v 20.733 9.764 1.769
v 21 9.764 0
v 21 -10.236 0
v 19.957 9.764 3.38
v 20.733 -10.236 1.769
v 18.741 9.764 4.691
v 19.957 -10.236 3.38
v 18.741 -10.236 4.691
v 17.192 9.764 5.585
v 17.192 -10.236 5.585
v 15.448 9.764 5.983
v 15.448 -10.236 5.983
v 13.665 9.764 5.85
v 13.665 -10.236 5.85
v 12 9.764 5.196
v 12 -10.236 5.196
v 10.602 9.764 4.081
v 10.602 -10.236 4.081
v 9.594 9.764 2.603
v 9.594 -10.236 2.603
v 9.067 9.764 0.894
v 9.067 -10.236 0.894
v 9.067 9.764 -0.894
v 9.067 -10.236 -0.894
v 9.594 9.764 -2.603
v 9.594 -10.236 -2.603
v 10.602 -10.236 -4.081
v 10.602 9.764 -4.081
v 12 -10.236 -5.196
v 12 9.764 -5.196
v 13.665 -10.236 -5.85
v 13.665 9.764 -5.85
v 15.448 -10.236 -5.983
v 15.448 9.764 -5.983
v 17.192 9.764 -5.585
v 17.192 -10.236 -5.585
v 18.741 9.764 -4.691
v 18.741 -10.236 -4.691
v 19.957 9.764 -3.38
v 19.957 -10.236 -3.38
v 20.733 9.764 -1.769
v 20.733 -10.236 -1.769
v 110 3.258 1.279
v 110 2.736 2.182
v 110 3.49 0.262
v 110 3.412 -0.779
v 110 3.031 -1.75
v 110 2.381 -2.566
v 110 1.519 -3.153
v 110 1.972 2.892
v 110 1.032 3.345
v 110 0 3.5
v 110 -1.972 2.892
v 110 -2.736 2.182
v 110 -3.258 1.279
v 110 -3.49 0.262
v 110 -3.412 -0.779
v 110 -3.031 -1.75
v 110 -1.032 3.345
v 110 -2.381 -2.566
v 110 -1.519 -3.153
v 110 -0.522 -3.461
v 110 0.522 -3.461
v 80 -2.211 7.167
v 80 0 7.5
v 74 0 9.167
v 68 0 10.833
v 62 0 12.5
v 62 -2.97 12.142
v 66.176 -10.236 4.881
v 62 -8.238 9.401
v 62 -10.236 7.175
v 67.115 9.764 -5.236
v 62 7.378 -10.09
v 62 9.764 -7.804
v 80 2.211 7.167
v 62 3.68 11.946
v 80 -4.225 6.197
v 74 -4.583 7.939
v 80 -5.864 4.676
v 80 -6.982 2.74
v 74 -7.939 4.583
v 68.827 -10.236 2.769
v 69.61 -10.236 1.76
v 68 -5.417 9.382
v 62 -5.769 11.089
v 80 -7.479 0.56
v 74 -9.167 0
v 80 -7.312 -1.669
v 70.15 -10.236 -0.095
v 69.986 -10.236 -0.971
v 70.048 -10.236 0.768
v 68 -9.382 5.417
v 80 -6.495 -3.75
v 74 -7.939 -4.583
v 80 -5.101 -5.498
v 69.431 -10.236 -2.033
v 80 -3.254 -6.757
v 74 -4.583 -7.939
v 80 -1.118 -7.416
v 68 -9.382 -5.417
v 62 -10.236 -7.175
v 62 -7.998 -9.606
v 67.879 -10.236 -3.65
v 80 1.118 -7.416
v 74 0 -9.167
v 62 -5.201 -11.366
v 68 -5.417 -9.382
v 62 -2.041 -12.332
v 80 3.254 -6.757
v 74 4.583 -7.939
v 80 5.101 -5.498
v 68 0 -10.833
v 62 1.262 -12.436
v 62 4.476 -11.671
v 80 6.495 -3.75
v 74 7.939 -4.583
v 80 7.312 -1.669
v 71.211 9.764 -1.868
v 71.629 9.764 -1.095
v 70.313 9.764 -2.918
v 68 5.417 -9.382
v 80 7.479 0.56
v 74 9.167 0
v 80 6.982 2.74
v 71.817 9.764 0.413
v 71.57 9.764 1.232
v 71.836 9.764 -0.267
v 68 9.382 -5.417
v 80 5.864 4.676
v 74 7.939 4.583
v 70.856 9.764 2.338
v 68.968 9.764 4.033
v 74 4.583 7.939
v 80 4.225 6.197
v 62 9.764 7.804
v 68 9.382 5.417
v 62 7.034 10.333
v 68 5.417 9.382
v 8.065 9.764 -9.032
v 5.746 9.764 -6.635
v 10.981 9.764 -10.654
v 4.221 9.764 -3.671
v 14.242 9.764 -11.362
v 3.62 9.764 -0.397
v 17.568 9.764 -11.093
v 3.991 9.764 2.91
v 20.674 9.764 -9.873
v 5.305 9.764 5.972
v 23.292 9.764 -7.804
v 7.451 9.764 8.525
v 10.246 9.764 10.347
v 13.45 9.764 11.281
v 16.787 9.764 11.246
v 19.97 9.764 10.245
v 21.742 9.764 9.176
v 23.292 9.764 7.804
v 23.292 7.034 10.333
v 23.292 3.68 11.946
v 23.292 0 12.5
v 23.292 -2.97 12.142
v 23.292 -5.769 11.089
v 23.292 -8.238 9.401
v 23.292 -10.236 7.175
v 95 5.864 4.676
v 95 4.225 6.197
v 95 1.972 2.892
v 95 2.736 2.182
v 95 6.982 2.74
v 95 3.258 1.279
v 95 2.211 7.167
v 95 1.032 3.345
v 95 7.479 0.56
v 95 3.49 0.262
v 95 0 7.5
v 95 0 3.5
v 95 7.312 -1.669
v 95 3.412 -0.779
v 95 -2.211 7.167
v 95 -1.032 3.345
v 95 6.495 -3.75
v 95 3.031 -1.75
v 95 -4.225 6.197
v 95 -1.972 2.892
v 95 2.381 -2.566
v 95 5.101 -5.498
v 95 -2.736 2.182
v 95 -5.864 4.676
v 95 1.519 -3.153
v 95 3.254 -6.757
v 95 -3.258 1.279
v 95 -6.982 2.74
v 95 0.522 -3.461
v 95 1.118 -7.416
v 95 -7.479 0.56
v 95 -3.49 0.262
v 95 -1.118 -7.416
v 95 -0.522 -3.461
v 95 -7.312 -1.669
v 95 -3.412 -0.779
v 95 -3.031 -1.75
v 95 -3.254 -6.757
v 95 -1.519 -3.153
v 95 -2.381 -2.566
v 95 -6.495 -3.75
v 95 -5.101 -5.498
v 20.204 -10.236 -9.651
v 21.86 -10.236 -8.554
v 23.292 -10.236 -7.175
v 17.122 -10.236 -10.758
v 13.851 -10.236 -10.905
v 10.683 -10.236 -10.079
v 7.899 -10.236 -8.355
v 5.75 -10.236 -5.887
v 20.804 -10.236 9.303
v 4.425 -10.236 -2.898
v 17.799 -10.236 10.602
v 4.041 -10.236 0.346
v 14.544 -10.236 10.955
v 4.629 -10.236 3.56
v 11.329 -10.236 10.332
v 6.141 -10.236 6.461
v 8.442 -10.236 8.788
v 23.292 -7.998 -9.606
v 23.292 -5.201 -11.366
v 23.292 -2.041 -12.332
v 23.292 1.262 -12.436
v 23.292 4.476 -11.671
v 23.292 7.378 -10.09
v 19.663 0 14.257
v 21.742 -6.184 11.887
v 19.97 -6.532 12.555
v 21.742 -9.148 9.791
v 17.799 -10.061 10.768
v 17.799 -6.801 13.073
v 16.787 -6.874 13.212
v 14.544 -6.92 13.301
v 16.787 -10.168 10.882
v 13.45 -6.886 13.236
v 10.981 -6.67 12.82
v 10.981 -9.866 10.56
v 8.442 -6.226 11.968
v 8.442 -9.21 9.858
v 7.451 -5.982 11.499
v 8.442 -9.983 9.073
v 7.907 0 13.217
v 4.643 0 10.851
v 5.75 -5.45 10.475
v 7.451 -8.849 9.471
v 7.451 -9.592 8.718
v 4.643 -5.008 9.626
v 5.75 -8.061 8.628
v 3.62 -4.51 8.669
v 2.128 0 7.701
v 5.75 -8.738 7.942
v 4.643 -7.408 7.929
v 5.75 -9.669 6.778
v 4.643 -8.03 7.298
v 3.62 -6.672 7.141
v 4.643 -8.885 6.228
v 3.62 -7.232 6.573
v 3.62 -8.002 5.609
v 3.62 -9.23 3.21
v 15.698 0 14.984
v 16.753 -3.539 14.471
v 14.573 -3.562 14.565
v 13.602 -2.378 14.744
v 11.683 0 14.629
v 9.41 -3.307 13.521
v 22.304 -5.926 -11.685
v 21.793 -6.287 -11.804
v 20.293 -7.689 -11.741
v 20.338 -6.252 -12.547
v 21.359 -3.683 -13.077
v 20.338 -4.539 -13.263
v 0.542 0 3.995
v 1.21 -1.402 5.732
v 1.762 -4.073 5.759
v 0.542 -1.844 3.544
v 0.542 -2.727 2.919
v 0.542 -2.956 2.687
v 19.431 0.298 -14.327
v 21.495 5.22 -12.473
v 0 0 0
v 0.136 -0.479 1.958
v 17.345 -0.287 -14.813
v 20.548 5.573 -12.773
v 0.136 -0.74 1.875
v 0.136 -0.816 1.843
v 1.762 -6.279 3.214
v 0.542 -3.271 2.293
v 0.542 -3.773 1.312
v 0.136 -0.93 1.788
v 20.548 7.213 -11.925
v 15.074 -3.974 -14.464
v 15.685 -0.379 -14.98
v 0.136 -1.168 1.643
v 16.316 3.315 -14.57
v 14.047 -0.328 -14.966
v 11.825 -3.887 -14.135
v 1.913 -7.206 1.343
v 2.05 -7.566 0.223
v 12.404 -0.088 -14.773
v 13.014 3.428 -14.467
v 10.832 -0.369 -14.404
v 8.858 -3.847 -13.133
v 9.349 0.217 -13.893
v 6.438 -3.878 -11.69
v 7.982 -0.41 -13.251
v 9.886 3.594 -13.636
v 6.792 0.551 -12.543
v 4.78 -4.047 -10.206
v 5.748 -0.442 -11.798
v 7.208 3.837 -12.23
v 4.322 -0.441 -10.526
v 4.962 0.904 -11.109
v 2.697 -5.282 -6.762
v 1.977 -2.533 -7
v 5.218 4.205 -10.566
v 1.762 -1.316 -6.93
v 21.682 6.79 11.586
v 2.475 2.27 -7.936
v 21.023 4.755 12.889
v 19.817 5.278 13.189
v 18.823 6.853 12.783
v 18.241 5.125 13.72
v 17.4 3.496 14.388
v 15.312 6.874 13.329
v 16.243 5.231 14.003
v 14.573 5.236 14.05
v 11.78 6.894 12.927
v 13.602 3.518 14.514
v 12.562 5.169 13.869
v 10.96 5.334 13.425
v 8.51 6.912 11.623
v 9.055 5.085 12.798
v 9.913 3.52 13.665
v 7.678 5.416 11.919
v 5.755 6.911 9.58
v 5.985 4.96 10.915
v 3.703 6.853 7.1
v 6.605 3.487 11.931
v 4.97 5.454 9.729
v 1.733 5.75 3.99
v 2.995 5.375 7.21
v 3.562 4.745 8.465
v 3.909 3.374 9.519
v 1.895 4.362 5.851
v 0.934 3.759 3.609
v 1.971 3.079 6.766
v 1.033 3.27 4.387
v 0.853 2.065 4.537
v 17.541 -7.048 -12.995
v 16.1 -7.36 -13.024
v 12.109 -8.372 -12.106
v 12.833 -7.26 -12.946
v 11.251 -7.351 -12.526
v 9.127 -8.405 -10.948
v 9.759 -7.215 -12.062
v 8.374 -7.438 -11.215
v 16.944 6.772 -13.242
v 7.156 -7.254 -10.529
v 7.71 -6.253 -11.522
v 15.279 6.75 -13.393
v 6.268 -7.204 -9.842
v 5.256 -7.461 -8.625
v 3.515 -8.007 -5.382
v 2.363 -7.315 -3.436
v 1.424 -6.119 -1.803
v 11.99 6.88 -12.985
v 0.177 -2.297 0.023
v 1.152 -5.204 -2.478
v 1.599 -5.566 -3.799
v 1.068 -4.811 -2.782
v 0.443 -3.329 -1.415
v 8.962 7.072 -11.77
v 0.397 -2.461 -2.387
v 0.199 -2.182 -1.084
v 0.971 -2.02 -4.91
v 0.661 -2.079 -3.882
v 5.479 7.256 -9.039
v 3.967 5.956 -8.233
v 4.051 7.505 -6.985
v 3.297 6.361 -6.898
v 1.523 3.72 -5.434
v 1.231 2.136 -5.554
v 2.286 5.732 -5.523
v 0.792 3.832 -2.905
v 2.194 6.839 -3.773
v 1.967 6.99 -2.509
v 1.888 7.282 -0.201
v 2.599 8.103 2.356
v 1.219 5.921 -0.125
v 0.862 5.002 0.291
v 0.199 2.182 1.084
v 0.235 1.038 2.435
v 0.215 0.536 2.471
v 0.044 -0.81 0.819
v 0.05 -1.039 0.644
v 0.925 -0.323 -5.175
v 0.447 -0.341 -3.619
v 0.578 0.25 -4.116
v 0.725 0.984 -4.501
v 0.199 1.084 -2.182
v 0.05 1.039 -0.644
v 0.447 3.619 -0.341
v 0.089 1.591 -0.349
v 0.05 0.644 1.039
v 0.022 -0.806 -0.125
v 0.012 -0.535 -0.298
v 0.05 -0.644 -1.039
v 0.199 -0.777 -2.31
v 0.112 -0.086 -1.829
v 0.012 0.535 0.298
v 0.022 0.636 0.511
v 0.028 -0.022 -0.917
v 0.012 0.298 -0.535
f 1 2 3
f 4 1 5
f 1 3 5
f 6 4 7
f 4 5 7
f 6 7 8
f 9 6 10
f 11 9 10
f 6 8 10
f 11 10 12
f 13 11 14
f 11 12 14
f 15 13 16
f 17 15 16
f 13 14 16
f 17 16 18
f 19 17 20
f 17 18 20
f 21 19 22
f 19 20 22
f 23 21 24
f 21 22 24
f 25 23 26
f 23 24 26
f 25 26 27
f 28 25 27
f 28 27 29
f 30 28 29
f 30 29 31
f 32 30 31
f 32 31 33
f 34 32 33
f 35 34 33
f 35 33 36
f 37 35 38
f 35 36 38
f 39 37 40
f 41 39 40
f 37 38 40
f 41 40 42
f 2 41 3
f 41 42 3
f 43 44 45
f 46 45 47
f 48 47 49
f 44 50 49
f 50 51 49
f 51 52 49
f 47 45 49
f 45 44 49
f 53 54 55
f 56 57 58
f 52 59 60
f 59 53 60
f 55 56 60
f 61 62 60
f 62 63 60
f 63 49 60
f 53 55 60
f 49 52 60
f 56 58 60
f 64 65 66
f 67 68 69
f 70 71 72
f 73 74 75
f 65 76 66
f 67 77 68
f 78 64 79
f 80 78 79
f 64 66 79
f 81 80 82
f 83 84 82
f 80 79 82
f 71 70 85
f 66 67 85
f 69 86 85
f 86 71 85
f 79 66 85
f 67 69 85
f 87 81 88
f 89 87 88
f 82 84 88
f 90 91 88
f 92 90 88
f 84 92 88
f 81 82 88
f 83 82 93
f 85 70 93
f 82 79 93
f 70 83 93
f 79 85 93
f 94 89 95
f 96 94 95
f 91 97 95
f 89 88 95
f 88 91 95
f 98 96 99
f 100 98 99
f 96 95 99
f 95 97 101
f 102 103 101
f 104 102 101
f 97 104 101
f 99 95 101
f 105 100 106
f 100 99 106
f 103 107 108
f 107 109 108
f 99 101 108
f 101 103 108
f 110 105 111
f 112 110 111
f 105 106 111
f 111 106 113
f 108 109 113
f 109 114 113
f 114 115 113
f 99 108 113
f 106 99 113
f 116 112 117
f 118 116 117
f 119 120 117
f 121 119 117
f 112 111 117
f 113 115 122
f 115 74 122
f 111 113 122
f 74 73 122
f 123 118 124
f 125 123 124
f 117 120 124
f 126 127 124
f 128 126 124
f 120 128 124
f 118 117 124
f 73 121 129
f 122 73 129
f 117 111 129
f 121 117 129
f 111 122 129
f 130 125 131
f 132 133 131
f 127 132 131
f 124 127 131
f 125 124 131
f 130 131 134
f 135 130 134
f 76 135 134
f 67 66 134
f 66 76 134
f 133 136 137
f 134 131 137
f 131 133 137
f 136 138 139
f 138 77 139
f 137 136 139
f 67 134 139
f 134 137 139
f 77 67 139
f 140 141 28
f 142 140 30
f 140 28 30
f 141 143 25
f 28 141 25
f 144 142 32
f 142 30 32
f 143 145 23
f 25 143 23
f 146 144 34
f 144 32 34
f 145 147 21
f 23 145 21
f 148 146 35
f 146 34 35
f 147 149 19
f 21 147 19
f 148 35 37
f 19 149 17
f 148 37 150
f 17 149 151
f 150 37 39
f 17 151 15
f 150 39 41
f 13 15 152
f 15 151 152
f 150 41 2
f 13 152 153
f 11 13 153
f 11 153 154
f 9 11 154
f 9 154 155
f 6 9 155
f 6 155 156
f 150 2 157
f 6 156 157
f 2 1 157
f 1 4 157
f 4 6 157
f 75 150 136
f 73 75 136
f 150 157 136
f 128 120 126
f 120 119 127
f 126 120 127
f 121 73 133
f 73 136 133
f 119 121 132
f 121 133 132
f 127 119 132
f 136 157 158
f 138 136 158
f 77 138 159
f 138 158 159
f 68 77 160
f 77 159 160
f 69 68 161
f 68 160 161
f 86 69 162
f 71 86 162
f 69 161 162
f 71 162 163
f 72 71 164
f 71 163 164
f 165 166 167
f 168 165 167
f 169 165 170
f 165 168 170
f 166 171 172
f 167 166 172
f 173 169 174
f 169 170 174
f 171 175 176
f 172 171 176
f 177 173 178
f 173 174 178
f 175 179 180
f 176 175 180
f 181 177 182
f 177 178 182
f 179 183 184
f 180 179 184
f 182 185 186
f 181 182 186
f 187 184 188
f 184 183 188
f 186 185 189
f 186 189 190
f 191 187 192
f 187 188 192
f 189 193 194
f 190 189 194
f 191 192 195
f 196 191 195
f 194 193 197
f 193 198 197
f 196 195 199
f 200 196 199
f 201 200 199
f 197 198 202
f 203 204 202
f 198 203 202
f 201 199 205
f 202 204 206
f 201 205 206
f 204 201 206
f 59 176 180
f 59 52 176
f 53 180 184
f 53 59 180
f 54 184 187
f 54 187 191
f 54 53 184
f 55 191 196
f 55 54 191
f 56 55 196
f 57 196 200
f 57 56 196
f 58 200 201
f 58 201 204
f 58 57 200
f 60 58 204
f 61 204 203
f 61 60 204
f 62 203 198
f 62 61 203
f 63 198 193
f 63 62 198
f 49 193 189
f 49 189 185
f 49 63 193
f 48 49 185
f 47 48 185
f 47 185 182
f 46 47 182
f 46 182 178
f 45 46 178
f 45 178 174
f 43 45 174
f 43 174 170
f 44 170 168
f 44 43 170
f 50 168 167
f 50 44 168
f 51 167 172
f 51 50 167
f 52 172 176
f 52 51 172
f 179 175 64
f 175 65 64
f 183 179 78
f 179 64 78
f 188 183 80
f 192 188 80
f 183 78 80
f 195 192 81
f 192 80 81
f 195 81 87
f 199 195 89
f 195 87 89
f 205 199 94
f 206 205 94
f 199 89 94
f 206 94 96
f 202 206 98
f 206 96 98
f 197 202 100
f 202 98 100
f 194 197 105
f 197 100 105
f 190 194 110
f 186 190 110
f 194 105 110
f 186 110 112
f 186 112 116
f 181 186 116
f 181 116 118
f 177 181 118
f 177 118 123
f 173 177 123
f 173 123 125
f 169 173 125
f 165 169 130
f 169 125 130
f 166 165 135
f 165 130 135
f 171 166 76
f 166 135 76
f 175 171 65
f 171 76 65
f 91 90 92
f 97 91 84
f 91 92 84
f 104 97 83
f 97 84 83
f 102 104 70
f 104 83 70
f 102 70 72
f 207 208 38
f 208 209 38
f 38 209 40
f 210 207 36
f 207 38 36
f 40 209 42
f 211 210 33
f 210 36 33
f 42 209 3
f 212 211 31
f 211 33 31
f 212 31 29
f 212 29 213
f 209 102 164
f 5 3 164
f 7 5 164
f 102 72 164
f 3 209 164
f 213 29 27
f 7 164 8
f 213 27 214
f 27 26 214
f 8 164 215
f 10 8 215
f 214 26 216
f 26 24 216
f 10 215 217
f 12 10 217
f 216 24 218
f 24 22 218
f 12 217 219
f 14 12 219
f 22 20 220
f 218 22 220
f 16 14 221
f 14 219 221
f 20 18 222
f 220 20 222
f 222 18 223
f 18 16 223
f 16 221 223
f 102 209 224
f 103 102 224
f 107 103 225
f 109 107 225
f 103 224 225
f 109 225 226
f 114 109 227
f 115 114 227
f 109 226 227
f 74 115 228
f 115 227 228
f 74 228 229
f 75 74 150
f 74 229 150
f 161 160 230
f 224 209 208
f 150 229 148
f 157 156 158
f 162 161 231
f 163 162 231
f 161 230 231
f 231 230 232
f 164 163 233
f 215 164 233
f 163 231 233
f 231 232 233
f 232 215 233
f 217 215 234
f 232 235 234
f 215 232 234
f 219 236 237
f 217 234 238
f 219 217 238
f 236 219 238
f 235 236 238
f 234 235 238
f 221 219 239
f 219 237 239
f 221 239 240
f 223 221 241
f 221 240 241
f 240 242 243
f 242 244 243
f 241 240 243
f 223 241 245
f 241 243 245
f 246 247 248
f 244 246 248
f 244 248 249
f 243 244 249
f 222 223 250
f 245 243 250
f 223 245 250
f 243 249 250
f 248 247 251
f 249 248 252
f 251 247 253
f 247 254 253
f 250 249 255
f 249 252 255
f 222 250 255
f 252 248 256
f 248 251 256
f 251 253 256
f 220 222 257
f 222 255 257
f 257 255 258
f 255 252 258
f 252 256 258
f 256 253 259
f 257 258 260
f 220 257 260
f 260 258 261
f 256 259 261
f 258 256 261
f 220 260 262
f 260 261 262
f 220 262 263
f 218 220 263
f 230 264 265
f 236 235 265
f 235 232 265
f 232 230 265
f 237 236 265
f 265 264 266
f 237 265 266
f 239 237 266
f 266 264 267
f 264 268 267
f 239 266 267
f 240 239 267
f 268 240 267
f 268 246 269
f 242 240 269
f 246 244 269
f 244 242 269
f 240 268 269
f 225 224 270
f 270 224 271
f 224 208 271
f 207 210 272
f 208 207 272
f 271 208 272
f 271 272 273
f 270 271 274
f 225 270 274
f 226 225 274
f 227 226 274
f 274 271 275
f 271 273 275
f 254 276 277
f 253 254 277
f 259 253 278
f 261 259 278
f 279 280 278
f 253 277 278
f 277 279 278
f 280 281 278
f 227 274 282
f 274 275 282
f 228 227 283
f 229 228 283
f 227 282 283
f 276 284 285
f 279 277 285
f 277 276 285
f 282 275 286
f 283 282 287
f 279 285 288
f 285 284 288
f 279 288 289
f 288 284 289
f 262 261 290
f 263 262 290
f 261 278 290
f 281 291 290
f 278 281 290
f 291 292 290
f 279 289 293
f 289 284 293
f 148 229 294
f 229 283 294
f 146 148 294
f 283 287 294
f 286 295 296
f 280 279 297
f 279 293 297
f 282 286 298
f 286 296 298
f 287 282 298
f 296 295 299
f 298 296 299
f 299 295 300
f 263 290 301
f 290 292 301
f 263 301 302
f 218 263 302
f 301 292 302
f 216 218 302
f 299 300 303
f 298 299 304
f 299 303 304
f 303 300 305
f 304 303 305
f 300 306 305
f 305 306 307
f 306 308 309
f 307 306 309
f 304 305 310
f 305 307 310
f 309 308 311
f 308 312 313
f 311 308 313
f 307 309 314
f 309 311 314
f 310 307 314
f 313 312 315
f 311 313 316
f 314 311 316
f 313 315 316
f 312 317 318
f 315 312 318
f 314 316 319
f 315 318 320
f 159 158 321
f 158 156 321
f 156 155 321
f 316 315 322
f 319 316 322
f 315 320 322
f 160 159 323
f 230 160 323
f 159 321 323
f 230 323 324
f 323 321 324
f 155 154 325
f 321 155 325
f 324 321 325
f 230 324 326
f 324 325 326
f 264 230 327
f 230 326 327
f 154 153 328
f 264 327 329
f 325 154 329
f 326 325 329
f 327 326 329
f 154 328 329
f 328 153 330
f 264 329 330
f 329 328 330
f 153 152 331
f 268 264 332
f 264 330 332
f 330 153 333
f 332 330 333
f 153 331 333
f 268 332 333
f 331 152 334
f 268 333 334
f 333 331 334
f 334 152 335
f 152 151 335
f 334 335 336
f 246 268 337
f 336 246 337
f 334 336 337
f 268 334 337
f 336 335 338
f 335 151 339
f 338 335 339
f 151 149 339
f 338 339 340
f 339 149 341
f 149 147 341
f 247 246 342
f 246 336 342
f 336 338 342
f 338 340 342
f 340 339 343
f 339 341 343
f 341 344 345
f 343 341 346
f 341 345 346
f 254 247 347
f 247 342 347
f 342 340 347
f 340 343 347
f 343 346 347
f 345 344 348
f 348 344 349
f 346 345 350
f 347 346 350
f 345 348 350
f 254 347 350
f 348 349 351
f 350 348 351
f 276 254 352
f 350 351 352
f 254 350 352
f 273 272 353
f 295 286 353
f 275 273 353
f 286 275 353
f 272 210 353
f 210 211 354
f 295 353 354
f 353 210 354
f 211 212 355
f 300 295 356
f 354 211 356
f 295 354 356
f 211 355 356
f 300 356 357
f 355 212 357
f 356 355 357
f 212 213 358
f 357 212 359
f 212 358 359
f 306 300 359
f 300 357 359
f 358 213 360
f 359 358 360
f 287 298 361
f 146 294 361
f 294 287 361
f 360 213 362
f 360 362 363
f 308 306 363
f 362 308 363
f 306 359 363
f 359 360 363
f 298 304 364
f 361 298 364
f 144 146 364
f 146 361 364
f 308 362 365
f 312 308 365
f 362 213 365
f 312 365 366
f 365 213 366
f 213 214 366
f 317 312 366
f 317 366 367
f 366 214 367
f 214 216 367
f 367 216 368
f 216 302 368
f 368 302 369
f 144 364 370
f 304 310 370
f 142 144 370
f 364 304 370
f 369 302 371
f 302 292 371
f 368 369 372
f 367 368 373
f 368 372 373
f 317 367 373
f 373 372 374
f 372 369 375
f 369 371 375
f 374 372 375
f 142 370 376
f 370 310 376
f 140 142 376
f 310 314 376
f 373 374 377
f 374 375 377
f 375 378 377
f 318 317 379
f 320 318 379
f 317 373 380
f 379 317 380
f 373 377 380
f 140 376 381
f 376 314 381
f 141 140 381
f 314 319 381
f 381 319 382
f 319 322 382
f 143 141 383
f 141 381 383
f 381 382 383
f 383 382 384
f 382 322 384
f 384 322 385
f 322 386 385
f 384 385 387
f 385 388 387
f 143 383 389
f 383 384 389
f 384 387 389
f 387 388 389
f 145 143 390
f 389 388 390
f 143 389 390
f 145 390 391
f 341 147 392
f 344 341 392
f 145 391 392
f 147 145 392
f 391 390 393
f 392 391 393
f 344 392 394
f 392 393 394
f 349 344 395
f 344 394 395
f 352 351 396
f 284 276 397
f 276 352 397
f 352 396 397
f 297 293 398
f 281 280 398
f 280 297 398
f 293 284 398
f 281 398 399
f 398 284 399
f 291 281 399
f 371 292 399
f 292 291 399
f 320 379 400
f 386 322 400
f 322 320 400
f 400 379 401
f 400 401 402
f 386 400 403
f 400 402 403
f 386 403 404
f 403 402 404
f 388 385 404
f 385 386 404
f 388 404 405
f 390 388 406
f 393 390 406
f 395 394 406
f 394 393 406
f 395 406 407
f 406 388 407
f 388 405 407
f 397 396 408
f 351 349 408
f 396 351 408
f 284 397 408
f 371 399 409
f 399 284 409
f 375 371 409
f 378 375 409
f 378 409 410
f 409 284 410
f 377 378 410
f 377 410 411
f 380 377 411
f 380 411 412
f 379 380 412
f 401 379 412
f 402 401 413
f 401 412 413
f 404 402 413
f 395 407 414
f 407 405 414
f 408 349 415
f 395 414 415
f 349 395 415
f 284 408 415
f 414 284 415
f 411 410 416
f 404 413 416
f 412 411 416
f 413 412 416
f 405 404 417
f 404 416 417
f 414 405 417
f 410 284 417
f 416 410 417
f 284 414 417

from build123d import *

# Parameters (mm, degrees)
F0_W     = 15
F0_H     = 3.5
F2_R     = 6
F3_DEPTH = 50
F5_DEPTH = 25


with BuildPart() as f1:
    # F0 (on Front) → F1 (revolve)
    with BuildSketch(Plane.XZ):
        with BuildLine():
            Line((62, 12.5), (23.291562, 12.5))
            ThreePointArc((23.291562, 12.5), (7.906814, 13.21691), (0, 0))
            Line((0, 0), (62, 0))
            Line((62, 0), (62, 12.5))
        make_face()
        Polygon((80, 7.5), (62, 12.5), (62, 0), (80, 0), align=None)
        Polygon((95, 7.5), (80, 7.5), (80, 0), (95, 0), (95, 3.5), align=None)
        with Locations((102.5, 1.75)):
            Rectangle(F0_W, F0_H)
    revolve(axis=Axis((60.8708, 0, 0), (1, 0, 0)))

    # F2 (on Front) → F3 (cut, symmetric)
    with BuildSketch(Plane.XZ):
        with Locations((15, 0)):
            Circle(F2_R)
    extrude(amount=F3_DEPTH, both=True, mode=Mode.SUBTRACT)

    # F4 (on Top) → F5 (cut, symmetric)
    with BuildSketch(Plane.XY):
        Polygon((0, -10.235786), (0, 0), (0, 9.764214), (74.575491, 9.764214), (74.575491, 15), (-74.575491, 15), (-74.575491, -15), (74.575491, -15), (74.575491, -10.235786), align=None)
    extrude(amount=F5_DEPTH, both=True, mode=Mode.SUBTRACT)


solid = f1.part
